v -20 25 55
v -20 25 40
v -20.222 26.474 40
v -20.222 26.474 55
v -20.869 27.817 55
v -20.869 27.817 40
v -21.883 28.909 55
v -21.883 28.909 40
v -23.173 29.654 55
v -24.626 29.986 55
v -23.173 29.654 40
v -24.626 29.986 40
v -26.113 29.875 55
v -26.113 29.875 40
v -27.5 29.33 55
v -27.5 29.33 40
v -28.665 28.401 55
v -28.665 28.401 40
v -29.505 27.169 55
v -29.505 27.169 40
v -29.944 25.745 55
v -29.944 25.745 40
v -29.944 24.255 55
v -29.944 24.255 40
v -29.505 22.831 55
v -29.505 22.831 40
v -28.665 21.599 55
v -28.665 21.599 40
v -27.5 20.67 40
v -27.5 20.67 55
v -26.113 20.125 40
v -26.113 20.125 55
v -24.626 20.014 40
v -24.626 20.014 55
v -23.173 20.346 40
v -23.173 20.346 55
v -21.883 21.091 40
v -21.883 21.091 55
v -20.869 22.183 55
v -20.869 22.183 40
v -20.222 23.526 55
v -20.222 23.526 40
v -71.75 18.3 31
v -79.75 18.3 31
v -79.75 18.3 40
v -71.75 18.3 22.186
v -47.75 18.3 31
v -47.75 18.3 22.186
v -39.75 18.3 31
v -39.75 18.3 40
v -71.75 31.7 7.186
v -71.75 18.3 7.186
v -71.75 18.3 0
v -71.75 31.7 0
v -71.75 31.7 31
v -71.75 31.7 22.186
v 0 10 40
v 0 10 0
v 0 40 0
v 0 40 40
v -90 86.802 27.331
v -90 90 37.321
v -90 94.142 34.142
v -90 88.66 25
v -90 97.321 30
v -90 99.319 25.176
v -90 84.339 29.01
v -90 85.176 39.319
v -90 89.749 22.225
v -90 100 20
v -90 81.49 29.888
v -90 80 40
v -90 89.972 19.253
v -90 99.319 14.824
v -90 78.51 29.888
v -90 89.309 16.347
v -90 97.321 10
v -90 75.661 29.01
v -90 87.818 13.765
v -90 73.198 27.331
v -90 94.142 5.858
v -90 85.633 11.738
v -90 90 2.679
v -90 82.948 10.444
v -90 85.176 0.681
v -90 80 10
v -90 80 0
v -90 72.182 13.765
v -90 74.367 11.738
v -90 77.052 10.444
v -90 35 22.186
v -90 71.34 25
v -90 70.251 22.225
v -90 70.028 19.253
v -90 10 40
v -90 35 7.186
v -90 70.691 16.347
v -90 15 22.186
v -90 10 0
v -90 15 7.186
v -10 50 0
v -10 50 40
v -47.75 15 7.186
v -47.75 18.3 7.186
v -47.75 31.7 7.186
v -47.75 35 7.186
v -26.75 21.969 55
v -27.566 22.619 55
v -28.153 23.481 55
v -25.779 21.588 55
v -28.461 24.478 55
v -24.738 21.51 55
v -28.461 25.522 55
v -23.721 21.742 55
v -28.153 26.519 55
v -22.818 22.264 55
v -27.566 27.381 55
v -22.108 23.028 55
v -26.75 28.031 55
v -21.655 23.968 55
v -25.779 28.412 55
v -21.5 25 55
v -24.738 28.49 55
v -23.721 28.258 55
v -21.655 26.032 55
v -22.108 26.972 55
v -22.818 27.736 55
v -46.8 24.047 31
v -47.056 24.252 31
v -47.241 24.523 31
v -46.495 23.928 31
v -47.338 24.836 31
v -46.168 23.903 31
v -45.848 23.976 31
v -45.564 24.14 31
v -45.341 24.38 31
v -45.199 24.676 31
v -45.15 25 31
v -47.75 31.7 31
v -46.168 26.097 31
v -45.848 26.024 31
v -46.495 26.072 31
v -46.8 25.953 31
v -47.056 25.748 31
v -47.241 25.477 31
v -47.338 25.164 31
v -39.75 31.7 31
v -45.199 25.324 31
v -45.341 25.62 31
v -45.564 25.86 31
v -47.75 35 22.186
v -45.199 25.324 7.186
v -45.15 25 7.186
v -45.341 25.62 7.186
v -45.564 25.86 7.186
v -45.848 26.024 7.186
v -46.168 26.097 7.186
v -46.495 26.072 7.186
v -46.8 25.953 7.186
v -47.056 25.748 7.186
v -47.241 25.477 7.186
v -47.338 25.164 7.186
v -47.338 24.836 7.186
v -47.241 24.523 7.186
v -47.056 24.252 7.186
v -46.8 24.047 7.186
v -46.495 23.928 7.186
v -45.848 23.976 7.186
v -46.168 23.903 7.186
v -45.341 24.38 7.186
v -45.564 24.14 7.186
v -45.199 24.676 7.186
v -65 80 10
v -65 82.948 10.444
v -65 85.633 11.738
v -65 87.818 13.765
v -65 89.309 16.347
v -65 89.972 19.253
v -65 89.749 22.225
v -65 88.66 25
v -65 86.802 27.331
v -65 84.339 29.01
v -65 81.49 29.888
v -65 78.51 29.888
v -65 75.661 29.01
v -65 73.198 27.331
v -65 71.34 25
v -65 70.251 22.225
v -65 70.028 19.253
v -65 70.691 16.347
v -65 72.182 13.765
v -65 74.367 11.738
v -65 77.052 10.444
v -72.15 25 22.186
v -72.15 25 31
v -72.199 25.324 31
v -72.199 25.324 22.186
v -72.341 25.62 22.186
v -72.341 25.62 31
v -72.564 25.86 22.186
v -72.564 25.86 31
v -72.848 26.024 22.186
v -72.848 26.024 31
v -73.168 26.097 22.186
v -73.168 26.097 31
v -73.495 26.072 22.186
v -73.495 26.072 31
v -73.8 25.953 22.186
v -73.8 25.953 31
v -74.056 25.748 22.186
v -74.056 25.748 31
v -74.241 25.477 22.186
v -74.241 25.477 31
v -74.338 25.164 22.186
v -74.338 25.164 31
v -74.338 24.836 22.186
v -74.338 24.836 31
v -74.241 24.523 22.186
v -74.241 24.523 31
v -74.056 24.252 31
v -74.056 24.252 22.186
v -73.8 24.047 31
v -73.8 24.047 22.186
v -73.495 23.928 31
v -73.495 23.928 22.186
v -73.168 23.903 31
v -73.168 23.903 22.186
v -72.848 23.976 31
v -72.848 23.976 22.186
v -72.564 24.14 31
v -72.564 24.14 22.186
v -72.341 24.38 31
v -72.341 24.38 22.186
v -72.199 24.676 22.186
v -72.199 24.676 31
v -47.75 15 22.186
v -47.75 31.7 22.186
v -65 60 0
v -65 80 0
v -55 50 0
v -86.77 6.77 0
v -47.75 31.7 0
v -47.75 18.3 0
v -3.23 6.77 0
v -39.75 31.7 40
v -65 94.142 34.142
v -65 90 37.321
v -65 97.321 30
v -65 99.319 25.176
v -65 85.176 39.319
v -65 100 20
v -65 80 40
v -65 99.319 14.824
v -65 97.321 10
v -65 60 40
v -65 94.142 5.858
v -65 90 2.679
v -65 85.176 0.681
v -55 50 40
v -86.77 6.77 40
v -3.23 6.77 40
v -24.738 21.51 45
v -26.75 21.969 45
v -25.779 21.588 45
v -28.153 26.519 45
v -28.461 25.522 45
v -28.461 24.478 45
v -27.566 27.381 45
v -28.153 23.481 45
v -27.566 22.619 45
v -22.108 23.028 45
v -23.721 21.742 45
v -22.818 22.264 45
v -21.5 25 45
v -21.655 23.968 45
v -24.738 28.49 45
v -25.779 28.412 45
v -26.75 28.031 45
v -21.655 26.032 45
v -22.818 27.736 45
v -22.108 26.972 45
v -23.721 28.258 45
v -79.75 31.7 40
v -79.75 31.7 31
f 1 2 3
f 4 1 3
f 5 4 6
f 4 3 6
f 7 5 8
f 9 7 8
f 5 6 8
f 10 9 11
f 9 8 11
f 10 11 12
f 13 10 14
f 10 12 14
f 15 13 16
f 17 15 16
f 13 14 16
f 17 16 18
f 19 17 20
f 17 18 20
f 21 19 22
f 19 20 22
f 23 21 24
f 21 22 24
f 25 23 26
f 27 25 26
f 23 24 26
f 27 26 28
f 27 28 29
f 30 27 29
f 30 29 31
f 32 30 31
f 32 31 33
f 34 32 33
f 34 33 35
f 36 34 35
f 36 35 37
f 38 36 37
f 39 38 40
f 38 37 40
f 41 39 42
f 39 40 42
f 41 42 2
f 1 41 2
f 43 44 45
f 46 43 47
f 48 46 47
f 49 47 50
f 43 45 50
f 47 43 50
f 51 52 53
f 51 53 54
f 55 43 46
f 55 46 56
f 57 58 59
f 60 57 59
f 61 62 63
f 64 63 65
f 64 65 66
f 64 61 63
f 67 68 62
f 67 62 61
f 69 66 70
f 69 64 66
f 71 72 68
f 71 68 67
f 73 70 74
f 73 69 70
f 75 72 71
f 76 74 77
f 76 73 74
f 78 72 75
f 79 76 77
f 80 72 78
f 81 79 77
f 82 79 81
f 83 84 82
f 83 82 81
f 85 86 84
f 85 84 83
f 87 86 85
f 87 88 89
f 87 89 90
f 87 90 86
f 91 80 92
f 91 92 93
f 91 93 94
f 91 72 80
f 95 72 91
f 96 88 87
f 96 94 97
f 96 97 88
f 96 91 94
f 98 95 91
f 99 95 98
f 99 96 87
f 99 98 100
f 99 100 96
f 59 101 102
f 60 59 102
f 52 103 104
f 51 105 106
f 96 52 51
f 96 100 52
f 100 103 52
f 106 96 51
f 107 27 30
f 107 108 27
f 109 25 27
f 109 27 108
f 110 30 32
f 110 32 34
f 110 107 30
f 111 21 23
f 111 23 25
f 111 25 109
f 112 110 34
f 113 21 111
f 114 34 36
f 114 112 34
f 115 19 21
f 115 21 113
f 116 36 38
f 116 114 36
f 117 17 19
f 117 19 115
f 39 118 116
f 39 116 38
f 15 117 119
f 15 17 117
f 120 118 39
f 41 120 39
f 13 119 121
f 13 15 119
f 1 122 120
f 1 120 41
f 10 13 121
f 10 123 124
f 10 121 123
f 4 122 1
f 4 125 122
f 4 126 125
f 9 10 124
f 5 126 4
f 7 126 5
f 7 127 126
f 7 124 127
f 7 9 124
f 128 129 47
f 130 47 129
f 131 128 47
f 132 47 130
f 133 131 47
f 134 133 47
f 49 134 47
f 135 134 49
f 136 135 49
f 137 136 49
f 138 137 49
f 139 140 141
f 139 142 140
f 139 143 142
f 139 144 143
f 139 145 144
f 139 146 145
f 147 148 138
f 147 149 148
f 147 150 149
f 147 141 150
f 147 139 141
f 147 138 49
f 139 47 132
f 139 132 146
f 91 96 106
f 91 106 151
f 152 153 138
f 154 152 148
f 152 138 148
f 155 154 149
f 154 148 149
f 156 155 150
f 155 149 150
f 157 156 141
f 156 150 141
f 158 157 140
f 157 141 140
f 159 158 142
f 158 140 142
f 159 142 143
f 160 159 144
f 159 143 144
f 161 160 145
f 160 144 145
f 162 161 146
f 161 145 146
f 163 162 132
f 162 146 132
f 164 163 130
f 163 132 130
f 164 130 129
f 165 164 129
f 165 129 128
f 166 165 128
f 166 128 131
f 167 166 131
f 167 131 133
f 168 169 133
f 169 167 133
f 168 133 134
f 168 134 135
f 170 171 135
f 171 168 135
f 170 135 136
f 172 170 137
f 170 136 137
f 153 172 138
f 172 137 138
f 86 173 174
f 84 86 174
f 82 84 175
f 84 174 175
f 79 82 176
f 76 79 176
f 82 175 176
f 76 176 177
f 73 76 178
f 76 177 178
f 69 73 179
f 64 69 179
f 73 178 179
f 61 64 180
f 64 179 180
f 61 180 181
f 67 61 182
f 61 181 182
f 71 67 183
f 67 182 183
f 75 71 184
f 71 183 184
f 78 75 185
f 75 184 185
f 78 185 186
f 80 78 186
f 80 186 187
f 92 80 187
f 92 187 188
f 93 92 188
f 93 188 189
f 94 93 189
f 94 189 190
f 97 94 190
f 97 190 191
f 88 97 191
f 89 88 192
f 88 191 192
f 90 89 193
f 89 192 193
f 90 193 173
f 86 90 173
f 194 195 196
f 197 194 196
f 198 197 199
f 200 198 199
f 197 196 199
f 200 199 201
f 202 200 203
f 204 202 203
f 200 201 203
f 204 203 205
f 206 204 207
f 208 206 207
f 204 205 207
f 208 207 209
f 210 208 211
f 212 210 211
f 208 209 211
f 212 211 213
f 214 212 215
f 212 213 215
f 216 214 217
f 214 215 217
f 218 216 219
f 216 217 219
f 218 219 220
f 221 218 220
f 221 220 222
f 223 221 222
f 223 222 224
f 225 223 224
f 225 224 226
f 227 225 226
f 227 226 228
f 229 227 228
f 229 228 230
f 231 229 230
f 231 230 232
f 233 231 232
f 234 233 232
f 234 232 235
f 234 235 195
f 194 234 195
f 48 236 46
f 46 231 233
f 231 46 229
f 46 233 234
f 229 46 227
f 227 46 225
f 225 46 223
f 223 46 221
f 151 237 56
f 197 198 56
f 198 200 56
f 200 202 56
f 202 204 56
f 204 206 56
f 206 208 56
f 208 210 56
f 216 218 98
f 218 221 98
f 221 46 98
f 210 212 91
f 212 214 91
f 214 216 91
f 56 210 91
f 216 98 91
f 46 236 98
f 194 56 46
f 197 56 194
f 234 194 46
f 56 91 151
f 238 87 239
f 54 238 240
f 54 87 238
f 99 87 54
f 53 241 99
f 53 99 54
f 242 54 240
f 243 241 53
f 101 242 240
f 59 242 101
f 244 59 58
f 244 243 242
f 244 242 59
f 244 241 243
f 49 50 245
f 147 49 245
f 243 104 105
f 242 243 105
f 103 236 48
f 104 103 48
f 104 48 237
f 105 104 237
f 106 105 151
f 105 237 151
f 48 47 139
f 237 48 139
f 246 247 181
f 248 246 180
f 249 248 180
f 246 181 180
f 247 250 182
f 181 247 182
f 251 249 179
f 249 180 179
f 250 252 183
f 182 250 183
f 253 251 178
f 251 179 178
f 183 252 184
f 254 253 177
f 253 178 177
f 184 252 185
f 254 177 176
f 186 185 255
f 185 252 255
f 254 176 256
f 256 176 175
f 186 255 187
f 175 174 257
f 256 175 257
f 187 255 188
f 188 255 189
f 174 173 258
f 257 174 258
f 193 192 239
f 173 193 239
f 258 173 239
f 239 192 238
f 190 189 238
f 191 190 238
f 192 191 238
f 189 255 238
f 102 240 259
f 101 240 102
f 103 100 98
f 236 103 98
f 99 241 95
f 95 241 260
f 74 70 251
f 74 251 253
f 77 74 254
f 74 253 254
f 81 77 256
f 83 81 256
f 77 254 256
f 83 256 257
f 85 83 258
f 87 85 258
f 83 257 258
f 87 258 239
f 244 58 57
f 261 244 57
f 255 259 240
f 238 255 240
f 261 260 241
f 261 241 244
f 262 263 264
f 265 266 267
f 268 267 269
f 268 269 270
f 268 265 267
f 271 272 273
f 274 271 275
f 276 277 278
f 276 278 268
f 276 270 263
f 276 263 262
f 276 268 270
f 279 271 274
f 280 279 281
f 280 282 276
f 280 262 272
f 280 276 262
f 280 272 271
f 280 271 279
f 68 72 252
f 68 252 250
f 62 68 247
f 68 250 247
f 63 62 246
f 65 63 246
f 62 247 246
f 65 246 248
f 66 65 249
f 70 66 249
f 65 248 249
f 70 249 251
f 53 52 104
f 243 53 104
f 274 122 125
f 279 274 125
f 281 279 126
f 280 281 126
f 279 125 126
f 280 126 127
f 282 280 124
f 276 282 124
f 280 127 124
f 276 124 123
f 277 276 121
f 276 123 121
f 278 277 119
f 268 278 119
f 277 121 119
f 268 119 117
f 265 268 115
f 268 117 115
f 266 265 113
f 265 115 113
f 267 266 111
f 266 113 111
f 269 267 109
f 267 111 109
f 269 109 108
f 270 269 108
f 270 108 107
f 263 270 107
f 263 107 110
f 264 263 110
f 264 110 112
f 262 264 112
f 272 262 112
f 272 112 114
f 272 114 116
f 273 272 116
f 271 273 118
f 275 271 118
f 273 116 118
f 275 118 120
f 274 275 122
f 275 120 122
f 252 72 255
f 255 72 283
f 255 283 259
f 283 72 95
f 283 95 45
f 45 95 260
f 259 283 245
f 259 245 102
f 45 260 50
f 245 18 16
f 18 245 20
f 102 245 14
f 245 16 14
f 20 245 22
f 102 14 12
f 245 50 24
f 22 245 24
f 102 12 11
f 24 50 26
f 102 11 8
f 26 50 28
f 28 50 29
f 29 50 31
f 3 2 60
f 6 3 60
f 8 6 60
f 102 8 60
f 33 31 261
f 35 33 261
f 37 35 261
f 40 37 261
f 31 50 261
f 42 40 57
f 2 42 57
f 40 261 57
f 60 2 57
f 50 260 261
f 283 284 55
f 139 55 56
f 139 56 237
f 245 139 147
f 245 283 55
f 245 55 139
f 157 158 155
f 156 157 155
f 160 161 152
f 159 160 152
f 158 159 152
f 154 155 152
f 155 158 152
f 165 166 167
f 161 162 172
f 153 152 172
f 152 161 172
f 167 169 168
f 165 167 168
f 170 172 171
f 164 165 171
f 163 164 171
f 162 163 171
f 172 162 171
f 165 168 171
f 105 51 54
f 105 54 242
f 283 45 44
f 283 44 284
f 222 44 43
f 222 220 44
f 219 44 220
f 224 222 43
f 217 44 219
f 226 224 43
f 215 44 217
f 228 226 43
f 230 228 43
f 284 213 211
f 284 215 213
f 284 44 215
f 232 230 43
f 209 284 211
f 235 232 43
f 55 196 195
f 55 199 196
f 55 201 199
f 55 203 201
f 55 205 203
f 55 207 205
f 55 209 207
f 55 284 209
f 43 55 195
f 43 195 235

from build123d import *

# Parameters (mm, degrees)
SKETCH1_W           = 90
SKETCH1_H           = 50
BOSS_EXTRUDE1_DEPTH = 40
SKETCH22_W          = 40
SKETCH22_H          = 13.4
CUT_EXTRUDE11_DEPTH = 9
SKETCH24_W          = 24
SKETCH24_H          = 13.4
CUT_EXTRUDE12_DEPTH = 31
SKETCH25_R          = 1.1
CUT_EXTRUDE13_DEPTH = 31
SKETCH31_W          = 25
SKETCH31_H          = 40
BOSS_EXTRUDE2_DEPTH = 50
SKETCH32_R          = 10
CUT_EXTRUDE15_DEPTH = 25
CHAMFER1_SIZE       = 10
CUT_EXTRUDE16_REACH = 142.357
SKETCH35_W          = 15
SKETCH35_H          = 20
SKETCH36_W          = 12
SKETCH36_H          = 12
SKETCH36_R          = 3.5
BOSS_EXTRUDE3_DEPTH = 10
SKETCH37_W          = 95.999091547
SKETCH37_H          = 21.11006165
CUT_EXTRUDE17_DEPTH = 100
SKETCH21_R          = 5
BOSS_EXTRUDE4_DEPTH = 15
SKETCH38_R          = 3.5
CUT_EXTRUDE18_DEPTH = 10
BOSS_EXTRUDE5_START = -7.186432503
SKETCH39_R          = 1.1
BOSS_EXTRUDE5_DEPTH = 7.186432503


with BuildPart() as part:
    # Sketch1 → Boss-Extrude1 (new body)
    with BuildSketch(Plane.XY):
        with Locations((-45, 25)):
            Rectangle(SKETCH1_W, SKETCH1_H)
    extrude(amount=BOSS_EXTRUDE1_DEPTH)

    # Sketch22 → Cut-Extrude11 (cut)
    with BuildSketch(Plane.XY.offset(40)):
        with Locations((-59.75, 25)):
            Rectangle(SKETCH22_W, SKETCH22_H)
    extrude(amount=-CUT_EXTRUDE11_DEPTH, mode=Mode.SUBTRACT)

    # Sketch24 → Cut-Extrude12 (cut)
    with BuildSketch(Plane.XY.offset(31)):
        with Locations((-59.75, 25)):
            Rectangle(SKETCH24_W, SKETCH24_H)
    extrude(amount=-CUT_EXTRUDE12_DEPTH, mode=Mode.SUBTRACT)

    # Sketch25 → Cut-Extrude13 (cut)
    with BuildSketch(Plane.XY.offset(31)):
        with Locations((-73.25, 25)):
            Circle(SKETCH25_R)
        with Locations((-46.25, 25)):
            Circle(SKETCH25_R)
    extrude(amount=-CUT_EXTRUDE13_DEPTH, mode=Mode.SUBTRACT)

    # Sketch31 → Boss-Extrude2 (add)
    with BuildSketch(Plane(origin=(0, 50, 0), x_dir=(1, 0, 0), z_dir=(0, 1, 0))):
        with Locations((-77.5, -20)):
            Rectangle(SKETCH31_W, SKETCH31_H)
    extrude(amount=BOSS_EXTRUDE2_DEPTH)

    # Sketch32 → Cut-Extrude15 (cut)
    with BuildSketch(Plane(origin=(-65, 0, 0), x_dir=(0, 0, -1), z_dir=(1, 0, 0))):
        with BuildLine():
            ThreePointArc((-40, 80), (-34.142135624, 94.142135624), (-20, 100))
            Line((-20, 100), (-40, 100))
            Line((-40, 100), (-40, 80))
        make_face()
        with BuildLine():
            ThreePointArc((-20, 100), (-5.857864376, 94.142135624), (0, 80))
            Line((0, 80), (0, 100))
            Line((0, 100), (-20, 100))
        make_face()
        with Locations((-20, 80)):
            Circle(SKETCH32_R)
    extrude(amount=-CUT_EXTRUDE15_DEPTH, mode=Mode.SUBTRACT)

    # Chamfer1
    chamfer1_edges = [part.edges().sort_by_distance(p)[0] for p in [
        (-65, 50, 20),
        (0, 50, 20),
        (0, 0, 20),
        (-90, 0, 20),
    ]]
    chamfer(chamfer1_edges, length=CHAMFER1_SIZE)

    # Cut-Extrude16: up to this face of the body (flat: up to its plane)
    cut_extrude16_end = Plane(part.part.faces().sort_by_distance((-47.75, 25, 15.5))[0])
    # Sketch35 → Cut-Extrude16 (cut, up to the picked face)
    with BuildSketch(Plane.ZY.offset(90), mode=Mode.PRIVATE) as cut_extrude16_sk1:
        with Locations((14.686432503, 25)):
            Rectangle(SKETCH35_W, SKETCH35_H)
    cut_extrude16_tool1 = split(extrude(cut_extrude16_sk1.sketch, amount=-CUT_EXTRUDE16_REACH, mode=Mode.PRIVATE), bisect_by=cut_extrude16_end, keep=Keep.BOTH, mode=Mode.PRIVATE)
    add(cut_extrude16_tool1.solids().sort_by(Axis((-90, 25, 14.686433), (1, 0, 0)))[0], mode=Mode.SUBTRACT)

    # Sketch36 → Boss-Extrude3 (add)
    # profile 1 of 2: a face of its own
    with BuildSketch(Plane.XY.offset(40)):
        with Locations((-65, -6)):
            Rectangle(SKETCH36_W, SKETCH36_H)
        with Locations((-65, -6)):
            Circle(SKETCH36_R, mode=Mode.SUBTRACT)
    # profile 2 of 2: a face of its own
    with BuildSketch(Plane.XY.offset(40)):
        with Locations((-25, -6)):
            Rectangle(SKETCH36_W, SKETCH36_H)
        with Locations((-25, -6)):
            Circle(SKETCH36_R, mode=Mode.SUBTRACT)
    extrude(amount=-BOSS_EXTRUDE3_DEPTH)

    # Sketch37 → Cut-Extrude17 (cut)
    with BuildSketch(Plane.XY.offset(40)):
        with Locations((-45.7868778, -3.784559742)):
            Rectangle(SKETCH37_W, SKETCH37_H)
    extrude(amount=-CUT_EXTRUDE17_DEPTH, mode=Mode.SUBTRACT)

    # Sketch21 → Boss-Extrude4 (add)
    with BuildSketch(Plane.XY.offset(40)):
        with Locations((-25, 25)):
            Circle(SKETCH21_R)
    extrude(amount=BOSS_EXTRUDE4_DEPTH)

    # Sketch38 → Cut-Extrude18 (cut)
    with BuildSketch(Plane.XY.offset(55)):
        with Locations((-25, 25)):
            Circle(SKETCH38_R)
    extrude(amount=-CUT_EXTRUDE18_DEPTH, mode=Mode.SUBTRACT)

    # Sketch39 → Boss-Extrude5 (add)
    with BuildSketch(Plane(origin=(0, 0, 0), x_dir=(-1, 0, 0), z_dir=(0, 0, -1)).offset(BOSS_EXTRUDE5_START)):
        with Locations(Location((46.25, 25, 0), (0, 0, 180))):
            Circle(SKETCH39_R)
        with Locations(Location((73.25, 25, 0), (0, 0, 180))):
            Circle(SKETCH39_R)
    extrude(amount=BOSS_EXTRUDE5_DEPTH)


solid = part.part
